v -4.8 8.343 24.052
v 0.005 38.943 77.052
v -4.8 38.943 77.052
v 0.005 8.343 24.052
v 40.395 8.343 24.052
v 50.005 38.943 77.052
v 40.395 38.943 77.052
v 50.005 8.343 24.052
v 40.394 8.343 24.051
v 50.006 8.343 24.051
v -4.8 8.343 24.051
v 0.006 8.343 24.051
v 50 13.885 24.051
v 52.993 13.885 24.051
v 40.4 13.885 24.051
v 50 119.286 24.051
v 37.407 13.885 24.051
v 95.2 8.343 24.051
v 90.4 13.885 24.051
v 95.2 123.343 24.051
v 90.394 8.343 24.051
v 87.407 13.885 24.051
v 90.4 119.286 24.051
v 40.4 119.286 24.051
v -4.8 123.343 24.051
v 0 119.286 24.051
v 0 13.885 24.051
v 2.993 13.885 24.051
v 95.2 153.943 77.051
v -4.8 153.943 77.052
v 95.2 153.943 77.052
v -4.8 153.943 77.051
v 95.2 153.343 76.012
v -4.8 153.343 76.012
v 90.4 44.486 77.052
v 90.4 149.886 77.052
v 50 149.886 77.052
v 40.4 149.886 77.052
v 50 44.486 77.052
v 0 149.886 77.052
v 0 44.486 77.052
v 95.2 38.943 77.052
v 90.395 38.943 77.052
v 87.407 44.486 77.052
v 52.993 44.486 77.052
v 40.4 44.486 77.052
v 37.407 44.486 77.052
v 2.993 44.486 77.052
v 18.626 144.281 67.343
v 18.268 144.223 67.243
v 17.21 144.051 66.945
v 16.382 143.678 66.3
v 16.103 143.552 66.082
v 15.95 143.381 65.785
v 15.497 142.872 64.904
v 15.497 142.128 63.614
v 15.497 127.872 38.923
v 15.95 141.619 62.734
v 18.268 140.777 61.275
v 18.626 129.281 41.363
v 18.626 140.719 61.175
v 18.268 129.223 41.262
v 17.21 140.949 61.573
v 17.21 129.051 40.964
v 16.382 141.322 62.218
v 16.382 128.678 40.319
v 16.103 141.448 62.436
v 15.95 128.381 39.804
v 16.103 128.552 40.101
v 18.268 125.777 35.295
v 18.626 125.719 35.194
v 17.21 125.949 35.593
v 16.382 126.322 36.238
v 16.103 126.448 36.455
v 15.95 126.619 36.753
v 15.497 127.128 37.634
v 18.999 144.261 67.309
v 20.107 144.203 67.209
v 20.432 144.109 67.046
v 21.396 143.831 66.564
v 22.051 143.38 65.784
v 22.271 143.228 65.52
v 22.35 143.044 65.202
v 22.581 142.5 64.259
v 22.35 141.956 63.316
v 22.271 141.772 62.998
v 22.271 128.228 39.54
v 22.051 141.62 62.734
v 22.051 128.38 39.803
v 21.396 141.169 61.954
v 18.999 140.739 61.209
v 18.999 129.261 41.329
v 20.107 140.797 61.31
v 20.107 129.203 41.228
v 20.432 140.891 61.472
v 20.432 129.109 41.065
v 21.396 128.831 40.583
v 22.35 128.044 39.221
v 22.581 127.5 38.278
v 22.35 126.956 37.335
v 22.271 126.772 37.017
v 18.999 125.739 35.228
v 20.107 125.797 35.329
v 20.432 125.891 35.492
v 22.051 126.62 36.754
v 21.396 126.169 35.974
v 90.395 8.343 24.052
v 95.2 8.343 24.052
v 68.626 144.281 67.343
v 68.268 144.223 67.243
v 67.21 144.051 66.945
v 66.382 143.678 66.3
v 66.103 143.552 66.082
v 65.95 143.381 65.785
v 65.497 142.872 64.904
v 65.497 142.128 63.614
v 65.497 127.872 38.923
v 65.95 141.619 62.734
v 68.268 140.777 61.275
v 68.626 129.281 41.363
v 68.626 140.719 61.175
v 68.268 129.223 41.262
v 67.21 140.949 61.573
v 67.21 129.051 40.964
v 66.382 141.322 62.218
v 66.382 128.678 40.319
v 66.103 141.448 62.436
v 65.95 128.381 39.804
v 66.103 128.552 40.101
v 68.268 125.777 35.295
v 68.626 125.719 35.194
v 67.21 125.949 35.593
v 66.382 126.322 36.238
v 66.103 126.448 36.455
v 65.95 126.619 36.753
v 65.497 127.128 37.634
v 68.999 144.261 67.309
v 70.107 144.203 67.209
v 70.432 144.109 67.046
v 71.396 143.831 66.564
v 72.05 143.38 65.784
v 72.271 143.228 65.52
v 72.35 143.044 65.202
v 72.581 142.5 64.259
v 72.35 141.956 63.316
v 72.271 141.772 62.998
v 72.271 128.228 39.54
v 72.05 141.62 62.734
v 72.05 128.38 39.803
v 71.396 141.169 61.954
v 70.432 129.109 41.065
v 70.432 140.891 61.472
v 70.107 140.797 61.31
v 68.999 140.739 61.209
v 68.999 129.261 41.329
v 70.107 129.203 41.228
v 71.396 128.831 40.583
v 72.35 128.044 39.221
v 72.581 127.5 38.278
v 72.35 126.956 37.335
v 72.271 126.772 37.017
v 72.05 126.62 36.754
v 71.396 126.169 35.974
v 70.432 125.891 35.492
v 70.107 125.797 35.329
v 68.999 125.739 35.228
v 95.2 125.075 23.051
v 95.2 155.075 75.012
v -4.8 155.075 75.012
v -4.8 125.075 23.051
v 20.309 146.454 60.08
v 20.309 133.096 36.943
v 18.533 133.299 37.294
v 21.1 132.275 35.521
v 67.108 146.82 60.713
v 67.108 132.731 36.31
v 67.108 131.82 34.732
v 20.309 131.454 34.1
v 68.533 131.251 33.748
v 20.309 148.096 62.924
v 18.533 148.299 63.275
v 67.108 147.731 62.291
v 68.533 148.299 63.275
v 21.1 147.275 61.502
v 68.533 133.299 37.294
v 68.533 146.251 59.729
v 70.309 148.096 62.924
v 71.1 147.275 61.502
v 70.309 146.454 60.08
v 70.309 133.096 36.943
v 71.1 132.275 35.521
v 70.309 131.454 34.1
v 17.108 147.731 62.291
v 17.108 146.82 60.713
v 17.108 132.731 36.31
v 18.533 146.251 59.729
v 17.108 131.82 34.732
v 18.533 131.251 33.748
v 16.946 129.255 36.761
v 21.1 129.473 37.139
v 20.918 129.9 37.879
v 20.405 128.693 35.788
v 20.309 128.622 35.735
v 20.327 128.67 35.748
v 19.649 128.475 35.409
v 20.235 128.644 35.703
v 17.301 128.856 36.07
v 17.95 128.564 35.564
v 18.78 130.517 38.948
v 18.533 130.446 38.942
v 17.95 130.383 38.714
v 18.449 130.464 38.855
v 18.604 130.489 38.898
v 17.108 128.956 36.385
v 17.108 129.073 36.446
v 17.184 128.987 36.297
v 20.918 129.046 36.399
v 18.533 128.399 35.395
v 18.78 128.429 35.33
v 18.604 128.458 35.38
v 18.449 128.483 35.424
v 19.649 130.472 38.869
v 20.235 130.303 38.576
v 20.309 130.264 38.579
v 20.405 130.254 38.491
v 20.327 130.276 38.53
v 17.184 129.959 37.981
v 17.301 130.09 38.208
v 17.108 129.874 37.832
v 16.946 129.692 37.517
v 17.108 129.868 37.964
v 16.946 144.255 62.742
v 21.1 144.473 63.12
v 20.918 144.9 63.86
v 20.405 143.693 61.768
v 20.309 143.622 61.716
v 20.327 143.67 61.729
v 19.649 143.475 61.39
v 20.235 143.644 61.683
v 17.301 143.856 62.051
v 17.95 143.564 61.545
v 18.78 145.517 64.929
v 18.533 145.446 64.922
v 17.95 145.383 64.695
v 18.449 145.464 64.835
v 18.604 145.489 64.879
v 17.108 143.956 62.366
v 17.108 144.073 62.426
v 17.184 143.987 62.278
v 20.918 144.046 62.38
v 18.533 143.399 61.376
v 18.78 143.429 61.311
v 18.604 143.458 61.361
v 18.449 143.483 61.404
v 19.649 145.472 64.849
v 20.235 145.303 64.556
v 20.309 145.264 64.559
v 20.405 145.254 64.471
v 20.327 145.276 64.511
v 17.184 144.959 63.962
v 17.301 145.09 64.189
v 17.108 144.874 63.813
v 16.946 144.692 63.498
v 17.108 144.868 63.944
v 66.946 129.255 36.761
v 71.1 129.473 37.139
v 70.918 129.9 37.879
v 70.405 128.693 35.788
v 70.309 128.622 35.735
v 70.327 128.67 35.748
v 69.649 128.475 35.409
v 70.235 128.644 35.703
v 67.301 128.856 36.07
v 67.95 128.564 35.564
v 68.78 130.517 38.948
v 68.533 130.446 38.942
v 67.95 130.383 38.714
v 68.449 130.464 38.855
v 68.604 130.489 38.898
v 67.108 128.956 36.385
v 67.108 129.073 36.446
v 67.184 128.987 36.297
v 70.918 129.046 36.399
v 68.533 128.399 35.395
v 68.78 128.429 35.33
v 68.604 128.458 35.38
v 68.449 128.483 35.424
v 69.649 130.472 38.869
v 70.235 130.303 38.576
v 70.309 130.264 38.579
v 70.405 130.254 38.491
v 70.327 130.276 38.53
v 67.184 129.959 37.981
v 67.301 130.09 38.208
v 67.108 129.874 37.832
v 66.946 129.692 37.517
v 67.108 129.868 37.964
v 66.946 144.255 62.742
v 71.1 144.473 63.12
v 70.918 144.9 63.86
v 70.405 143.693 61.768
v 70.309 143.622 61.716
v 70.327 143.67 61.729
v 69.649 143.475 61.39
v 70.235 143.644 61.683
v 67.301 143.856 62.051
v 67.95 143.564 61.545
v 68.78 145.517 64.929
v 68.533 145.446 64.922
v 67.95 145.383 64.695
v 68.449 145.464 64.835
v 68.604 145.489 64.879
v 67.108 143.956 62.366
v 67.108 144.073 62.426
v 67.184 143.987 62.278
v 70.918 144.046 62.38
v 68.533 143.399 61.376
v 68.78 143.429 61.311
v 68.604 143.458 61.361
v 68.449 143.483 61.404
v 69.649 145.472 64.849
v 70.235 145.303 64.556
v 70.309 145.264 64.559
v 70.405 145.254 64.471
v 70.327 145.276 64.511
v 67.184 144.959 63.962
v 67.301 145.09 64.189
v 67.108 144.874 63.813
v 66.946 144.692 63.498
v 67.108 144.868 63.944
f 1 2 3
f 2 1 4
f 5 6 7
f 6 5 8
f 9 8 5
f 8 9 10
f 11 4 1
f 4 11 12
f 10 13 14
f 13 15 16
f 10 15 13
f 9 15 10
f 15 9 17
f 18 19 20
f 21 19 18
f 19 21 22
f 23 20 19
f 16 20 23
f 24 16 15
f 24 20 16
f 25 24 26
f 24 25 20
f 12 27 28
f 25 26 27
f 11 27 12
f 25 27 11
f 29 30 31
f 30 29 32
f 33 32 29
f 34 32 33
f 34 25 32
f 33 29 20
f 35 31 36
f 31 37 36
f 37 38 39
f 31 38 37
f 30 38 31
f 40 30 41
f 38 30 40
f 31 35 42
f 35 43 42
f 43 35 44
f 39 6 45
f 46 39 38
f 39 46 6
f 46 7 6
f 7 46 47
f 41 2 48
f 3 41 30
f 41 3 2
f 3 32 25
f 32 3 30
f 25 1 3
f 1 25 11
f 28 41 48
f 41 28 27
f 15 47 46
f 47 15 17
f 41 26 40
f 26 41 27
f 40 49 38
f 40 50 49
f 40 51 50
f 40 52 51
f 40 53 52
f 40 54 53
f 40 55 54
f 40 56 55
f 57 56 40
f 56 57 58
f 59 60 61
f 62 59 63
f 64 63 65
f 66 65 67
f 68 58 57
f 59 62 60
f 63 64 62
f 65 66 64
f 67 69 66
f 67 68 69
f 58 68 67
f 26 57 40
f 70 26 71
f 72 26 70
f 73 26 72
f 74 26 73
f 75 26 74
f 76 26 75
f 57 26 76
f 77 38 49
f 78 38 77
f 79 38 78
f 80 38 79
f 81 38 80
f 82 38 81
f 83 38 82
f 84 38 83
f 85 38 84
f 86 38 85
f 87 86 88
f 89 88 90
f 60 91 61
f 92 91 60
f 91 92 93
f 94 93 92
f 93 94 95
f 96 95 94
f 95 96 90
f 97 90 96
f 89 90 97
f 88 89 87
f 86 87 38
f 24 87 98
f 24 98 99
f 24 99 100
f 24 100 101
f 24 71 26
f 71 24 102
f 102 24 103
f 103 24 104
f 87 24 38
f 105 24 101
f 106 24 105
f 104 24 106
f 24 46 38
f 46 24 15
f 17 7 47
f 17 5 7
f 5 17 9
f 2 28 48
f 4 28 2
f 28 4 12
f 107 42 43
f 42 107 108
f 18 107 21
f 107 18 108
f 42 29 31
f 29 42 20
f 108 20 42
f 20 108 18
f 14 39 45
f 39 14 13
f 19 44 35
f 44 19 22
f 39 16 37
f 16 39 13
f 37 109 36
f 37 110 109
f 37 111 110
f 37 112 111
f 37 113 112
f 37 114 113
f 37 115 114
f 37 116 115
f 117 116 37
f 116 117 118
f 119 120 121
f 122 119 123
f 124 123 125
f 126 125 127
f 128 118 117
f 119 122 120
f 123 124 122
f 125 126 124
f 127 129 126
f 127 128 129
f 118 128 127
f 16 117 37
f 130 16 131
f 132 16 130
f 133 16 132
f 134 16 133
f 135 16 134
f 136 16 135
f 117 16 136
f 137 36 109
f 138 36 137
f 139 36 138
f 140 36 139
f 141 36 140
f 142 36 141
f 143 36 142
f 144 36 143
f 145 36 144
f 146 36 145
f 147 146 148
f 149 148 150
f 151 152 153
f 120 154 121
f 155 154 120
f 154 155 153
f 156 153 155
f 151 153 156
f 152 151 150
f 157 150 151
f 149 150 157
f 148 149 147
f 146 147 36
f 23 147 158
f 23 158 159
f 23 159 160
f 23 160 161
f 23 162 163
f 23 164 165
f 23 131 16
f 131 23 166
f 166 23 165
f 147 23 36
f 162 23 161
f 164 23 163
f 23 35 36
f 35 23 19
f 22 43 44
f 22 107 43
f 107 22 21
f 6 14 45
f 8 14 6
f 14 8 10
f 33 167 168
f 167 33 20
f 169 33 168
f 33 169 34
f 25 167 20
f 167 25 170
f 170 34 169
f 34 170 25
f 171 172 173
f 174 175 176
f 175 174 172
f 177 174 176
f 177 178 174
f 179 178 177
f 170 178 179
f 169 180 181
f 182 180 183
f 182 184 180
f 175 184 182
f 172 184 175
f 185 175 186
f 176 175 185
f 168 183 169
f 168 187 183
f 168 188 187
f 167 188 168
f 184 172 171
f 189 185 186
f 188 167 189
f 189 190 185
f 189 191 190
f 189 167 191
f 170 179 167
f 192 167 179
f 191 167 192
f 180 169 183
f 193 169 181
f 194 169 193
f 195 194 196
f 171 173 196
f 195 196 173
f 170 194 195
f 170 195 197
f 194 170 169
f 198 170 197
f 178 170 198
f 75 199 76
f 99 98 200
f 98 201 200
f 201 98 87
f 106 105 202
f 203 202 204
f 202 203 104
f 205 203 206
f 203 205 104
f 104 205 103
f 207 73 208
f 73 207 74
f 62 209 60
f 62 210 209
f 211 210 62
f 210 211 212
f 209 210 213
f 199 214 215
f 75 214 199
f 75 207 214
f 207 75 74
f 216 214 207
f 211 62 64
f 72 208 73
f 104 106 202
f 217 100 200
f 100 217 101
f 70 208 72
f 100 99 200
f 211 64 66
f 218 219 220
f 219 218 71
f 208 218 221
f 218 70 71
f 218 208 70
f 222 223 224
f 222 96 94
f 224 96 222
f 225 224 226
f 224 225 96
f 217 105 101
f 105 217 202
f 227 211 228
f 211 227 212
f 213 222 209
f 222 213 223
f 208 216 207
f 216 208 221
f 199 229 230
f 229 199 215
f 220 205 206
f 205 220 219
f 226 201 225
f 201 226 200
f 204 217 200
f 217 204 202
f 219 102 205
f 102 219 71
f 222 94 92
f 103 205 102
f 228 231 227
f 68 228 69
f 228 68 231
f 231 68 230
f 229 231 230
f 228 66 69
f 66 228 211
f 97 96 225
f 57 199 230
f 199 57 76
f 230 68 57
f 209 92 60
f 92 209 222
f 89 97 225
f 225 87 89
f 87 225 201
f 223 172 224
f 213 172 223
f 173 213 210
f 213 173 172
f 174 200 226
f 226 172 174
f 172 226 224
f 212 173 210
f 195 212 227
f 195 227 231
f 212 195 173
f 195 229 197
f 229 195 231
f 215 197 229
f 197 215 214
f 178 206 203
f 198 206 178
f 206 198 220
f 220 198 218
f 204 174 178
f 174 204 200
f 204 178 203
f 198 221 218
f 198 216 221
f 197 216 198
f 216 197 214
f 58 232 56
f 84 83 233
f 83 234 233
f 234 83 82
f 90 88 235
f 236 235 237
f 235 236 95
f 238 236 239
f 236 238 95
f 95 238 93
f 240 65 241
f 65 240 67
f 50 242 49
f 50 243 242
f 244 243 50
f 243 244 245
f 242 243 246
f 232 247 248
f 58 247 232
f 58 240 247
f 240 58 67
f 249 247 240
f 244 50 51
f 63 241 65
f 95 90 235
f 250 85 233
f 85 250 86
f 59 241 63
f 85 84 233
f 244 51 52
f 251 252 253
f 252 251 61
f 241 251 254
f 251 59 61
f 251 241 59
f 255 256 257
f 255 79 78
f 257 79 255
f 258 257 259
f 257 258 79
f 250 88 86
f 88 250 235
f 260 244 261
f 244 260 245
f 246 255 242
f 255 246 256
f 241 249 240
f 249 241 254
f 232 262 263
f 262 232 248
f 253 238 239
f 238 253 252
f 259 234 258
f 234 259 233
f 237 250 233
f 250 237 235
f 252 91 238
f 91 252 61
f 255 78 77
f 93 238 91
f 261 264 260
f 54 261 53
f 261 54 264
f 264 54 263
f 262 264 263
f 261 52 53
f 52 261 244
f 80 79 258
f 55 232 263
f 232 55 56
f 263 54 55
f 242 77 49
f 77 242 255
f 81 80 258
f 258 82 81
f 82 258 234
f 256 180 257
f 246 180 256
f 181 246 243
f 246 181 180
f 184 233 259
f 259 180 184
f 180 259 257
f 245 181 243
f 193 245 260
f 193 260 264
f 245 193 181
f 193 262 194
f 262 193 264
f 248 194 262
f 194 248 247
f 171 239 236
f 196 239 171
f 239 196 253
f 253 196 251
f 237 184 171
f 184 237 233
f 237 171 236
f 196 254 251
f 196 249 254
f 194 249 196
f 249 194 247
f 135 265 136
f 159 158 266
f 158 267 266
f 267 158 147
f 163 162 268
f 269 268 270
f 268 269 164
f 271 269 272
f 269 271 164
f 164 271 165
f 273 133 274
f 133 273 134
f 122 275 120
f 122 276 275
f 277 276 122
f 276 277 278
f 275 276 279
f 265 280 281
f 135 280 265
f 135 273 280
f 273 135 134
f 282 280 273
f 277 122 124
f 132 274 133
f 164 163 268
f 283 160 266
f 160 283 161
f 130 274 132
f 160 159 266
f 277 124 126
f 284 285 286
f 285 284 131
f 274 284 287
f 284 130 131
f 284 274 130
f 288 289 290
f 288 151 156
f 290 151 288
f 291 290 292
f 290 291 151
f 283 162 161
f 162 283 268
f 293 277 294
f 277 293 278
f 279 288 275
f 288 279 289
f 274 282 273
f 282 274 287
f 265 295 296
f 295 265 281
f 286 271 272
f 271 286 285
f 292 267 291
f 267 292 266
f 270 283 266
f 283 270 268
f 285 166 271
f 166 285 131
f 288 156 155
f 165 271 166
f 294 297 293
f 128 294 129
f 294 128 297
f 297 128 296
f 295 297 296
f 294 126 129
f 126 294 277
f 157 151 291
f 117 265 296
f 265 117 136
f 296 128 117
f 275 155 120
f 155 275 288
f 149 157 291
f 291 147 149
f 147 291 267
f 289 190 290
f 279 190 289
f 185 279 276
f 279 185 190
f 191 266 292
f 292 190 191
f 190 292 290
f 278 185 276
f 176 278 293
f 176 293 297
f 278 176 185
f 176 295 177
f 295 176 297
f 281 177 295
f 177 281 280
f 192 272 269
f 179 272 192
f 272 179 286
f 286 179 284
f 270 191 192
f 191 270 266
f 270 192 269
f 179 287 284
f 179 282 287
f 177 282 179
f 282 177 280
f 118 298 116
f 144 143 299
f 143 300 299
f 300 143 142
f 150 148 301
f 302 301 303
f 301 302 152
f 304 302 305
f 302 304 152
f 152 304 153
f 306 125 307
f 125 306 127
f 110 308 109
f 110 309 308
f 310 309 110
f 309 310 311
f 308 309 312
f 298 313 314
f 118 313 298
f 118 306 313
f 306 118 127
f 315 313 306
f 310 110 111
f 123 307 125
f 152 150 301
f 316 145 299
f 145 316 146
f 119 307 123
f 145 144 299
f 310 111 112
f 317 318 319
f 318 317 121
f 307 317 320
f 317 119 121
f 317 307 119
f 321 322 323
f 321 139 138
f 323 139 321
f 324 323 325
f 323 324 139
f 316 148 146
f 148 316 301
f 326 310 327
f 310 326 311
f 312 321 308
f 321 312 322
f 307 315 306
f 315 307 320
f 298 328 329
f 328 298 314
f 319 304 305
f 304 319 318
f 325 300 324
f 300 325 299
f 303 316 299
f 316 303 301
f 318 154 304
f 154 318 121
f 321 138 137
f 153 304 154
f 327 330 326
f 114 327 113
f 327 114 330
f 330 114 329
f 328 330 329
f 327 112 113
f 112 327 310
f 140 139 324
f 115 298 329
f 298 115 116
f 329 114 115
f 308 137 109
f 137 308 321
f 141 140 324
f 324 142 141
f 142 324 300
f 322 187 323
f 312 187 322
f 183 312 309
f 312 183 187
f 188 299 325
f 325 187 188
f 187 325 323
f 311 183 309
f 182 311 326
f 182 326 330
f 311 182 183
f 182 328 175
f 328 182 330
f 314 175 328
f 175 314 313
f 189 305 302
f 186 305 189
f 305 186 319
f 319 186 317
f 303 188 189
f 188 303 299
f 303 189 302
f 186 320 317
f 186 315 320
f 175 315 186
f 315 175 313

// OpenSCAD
t=1.2;
packet=[38,103,5];

rotate([-30,0,0]) {
  translate([0,0,25]) bracket();
  //  base();
  //  main();
}

module screw() {
  translate([0,8,0]) rotate([90,0,0]) {
    translate([0,0,4]) cylinder(r1=2.1, r2=4.7, h=4);
    cylinder(r=2.1,h=5);
  }
}

module bracket() {
  bt=5;
  bh=60;
  bm=t*bt*2;
  sm=t*2;
  md=bm-sm;

  difference() {
    union() {
      sheath(false,bt,true,bh);
      translate([packet[0]+t*bt*2,0,0]) sheath(false,bt,true,bh);
      translate([-md/2,(packet[1]+bm)*(sqrt(3)/2)-md/2,(packet[1]+bm)/2]) cube([(packet[0]+t*bt*2)*2,2,bh]);
    }
    translate([packet[0]/2,(packet[1]+md/2)*(sqrt(3)/2)-md/2+1,(packet[1]+md/2)/2]) {
      translate([0,0,bh*0.3]) screw();
      translate([0,0,bh*0.8]) screw();
      translate([packet[0]+t*bt*2,0,bh*0.3]) screw();
      translate([packet[0]+t*bt*2,0,bh*0.8]) screw();

    }
  }
}

module base() {
  translate([0,0,-t-packet[2]]) difference() {
    translate([-t,-t,0]) trapezoid(packet[0]+t*4,packet[1]+t*4,t+packet[2],30);
    translate([t,-t*2,t]) trapezoid(packet[0],packet[1]+t*3+0.1,t+packet[2],30);
    rotate([30,0,0]) translate([(packet[0]+t*2)/2,7,0]) {
      cylinder(r=11,h=5);
      translate([-11,-10,0]) cube([22,10,5]);
      translate([-packet[0]/2,-10,0]) cube([packet[0],5,5]);
    }

  }

  difference() {
    sheath(false);
    translate([(packet[0]+t*2)/2,5,7]) rotate([90,0,0]) union() {
        cylinder(r=11,h=10);
        translate([-11,-10,0]) cube([22,10,10]);
    }
  }
}


module main() {
  difference() {
    trapezoid(packet[0]+t*2,packet[1]+t*2,100,30);
    translate([t,t,-1]) trapezoid(packet[0],packet[1],102,30);
    translate([(packet[0]+t*2)/2,5,7]) rotate([90,0,0]) union() {
      cylinder(r=11,h=10);
      translate([-11,-10,0]) cube([22,10,10]);
    }
  }

  translate([0,0,97]) sheath();
}

module sheath(bevel=true,m=2, bracket=false,h=20) {
  bm=t*m*2;
  sm=t*2;
  md=bm-sm;
  translate([-md/2,-md/2,0]) difference() {
    hull() {
      translate([0,0,t]) trapezoid(packet[0]+bm,packet[1]+bm,h,30);
      if( bevel ){
        translate([m/2,m/2,0]) trapezoid(packet[0]+sm,packet[1]+sm,t,30);
      }else{
        trapezoid(packet[0]+bm,packet[1]+bm,t,30);
      }

    }
    translate([md/2,md/2,-1]) trapezoid(packet[0]+sm,packet[1]+sm,h+5,30);
    if( bracket ) {
      lw=packet[0]+sm;
      sw=packet[0]-t*3;
      wd=lw-sw;
      translate([md/2,0,-1]) hull() {
        translate([0,-0.01,0]) cube([lw,.001,h+5]);
        translate([wd/2,md/2+0.01,0]) cube([sw,.001,h+5]);
      }
    }
  }
} 

module trapezoid(x,y,z,a) {
  hull() {
    rotate([a,0,0]) cube([x,y,0.001]);
    translate([0,0,z]) rotate([a,0,0]) cube([x,y,0.001]);
  }
}
